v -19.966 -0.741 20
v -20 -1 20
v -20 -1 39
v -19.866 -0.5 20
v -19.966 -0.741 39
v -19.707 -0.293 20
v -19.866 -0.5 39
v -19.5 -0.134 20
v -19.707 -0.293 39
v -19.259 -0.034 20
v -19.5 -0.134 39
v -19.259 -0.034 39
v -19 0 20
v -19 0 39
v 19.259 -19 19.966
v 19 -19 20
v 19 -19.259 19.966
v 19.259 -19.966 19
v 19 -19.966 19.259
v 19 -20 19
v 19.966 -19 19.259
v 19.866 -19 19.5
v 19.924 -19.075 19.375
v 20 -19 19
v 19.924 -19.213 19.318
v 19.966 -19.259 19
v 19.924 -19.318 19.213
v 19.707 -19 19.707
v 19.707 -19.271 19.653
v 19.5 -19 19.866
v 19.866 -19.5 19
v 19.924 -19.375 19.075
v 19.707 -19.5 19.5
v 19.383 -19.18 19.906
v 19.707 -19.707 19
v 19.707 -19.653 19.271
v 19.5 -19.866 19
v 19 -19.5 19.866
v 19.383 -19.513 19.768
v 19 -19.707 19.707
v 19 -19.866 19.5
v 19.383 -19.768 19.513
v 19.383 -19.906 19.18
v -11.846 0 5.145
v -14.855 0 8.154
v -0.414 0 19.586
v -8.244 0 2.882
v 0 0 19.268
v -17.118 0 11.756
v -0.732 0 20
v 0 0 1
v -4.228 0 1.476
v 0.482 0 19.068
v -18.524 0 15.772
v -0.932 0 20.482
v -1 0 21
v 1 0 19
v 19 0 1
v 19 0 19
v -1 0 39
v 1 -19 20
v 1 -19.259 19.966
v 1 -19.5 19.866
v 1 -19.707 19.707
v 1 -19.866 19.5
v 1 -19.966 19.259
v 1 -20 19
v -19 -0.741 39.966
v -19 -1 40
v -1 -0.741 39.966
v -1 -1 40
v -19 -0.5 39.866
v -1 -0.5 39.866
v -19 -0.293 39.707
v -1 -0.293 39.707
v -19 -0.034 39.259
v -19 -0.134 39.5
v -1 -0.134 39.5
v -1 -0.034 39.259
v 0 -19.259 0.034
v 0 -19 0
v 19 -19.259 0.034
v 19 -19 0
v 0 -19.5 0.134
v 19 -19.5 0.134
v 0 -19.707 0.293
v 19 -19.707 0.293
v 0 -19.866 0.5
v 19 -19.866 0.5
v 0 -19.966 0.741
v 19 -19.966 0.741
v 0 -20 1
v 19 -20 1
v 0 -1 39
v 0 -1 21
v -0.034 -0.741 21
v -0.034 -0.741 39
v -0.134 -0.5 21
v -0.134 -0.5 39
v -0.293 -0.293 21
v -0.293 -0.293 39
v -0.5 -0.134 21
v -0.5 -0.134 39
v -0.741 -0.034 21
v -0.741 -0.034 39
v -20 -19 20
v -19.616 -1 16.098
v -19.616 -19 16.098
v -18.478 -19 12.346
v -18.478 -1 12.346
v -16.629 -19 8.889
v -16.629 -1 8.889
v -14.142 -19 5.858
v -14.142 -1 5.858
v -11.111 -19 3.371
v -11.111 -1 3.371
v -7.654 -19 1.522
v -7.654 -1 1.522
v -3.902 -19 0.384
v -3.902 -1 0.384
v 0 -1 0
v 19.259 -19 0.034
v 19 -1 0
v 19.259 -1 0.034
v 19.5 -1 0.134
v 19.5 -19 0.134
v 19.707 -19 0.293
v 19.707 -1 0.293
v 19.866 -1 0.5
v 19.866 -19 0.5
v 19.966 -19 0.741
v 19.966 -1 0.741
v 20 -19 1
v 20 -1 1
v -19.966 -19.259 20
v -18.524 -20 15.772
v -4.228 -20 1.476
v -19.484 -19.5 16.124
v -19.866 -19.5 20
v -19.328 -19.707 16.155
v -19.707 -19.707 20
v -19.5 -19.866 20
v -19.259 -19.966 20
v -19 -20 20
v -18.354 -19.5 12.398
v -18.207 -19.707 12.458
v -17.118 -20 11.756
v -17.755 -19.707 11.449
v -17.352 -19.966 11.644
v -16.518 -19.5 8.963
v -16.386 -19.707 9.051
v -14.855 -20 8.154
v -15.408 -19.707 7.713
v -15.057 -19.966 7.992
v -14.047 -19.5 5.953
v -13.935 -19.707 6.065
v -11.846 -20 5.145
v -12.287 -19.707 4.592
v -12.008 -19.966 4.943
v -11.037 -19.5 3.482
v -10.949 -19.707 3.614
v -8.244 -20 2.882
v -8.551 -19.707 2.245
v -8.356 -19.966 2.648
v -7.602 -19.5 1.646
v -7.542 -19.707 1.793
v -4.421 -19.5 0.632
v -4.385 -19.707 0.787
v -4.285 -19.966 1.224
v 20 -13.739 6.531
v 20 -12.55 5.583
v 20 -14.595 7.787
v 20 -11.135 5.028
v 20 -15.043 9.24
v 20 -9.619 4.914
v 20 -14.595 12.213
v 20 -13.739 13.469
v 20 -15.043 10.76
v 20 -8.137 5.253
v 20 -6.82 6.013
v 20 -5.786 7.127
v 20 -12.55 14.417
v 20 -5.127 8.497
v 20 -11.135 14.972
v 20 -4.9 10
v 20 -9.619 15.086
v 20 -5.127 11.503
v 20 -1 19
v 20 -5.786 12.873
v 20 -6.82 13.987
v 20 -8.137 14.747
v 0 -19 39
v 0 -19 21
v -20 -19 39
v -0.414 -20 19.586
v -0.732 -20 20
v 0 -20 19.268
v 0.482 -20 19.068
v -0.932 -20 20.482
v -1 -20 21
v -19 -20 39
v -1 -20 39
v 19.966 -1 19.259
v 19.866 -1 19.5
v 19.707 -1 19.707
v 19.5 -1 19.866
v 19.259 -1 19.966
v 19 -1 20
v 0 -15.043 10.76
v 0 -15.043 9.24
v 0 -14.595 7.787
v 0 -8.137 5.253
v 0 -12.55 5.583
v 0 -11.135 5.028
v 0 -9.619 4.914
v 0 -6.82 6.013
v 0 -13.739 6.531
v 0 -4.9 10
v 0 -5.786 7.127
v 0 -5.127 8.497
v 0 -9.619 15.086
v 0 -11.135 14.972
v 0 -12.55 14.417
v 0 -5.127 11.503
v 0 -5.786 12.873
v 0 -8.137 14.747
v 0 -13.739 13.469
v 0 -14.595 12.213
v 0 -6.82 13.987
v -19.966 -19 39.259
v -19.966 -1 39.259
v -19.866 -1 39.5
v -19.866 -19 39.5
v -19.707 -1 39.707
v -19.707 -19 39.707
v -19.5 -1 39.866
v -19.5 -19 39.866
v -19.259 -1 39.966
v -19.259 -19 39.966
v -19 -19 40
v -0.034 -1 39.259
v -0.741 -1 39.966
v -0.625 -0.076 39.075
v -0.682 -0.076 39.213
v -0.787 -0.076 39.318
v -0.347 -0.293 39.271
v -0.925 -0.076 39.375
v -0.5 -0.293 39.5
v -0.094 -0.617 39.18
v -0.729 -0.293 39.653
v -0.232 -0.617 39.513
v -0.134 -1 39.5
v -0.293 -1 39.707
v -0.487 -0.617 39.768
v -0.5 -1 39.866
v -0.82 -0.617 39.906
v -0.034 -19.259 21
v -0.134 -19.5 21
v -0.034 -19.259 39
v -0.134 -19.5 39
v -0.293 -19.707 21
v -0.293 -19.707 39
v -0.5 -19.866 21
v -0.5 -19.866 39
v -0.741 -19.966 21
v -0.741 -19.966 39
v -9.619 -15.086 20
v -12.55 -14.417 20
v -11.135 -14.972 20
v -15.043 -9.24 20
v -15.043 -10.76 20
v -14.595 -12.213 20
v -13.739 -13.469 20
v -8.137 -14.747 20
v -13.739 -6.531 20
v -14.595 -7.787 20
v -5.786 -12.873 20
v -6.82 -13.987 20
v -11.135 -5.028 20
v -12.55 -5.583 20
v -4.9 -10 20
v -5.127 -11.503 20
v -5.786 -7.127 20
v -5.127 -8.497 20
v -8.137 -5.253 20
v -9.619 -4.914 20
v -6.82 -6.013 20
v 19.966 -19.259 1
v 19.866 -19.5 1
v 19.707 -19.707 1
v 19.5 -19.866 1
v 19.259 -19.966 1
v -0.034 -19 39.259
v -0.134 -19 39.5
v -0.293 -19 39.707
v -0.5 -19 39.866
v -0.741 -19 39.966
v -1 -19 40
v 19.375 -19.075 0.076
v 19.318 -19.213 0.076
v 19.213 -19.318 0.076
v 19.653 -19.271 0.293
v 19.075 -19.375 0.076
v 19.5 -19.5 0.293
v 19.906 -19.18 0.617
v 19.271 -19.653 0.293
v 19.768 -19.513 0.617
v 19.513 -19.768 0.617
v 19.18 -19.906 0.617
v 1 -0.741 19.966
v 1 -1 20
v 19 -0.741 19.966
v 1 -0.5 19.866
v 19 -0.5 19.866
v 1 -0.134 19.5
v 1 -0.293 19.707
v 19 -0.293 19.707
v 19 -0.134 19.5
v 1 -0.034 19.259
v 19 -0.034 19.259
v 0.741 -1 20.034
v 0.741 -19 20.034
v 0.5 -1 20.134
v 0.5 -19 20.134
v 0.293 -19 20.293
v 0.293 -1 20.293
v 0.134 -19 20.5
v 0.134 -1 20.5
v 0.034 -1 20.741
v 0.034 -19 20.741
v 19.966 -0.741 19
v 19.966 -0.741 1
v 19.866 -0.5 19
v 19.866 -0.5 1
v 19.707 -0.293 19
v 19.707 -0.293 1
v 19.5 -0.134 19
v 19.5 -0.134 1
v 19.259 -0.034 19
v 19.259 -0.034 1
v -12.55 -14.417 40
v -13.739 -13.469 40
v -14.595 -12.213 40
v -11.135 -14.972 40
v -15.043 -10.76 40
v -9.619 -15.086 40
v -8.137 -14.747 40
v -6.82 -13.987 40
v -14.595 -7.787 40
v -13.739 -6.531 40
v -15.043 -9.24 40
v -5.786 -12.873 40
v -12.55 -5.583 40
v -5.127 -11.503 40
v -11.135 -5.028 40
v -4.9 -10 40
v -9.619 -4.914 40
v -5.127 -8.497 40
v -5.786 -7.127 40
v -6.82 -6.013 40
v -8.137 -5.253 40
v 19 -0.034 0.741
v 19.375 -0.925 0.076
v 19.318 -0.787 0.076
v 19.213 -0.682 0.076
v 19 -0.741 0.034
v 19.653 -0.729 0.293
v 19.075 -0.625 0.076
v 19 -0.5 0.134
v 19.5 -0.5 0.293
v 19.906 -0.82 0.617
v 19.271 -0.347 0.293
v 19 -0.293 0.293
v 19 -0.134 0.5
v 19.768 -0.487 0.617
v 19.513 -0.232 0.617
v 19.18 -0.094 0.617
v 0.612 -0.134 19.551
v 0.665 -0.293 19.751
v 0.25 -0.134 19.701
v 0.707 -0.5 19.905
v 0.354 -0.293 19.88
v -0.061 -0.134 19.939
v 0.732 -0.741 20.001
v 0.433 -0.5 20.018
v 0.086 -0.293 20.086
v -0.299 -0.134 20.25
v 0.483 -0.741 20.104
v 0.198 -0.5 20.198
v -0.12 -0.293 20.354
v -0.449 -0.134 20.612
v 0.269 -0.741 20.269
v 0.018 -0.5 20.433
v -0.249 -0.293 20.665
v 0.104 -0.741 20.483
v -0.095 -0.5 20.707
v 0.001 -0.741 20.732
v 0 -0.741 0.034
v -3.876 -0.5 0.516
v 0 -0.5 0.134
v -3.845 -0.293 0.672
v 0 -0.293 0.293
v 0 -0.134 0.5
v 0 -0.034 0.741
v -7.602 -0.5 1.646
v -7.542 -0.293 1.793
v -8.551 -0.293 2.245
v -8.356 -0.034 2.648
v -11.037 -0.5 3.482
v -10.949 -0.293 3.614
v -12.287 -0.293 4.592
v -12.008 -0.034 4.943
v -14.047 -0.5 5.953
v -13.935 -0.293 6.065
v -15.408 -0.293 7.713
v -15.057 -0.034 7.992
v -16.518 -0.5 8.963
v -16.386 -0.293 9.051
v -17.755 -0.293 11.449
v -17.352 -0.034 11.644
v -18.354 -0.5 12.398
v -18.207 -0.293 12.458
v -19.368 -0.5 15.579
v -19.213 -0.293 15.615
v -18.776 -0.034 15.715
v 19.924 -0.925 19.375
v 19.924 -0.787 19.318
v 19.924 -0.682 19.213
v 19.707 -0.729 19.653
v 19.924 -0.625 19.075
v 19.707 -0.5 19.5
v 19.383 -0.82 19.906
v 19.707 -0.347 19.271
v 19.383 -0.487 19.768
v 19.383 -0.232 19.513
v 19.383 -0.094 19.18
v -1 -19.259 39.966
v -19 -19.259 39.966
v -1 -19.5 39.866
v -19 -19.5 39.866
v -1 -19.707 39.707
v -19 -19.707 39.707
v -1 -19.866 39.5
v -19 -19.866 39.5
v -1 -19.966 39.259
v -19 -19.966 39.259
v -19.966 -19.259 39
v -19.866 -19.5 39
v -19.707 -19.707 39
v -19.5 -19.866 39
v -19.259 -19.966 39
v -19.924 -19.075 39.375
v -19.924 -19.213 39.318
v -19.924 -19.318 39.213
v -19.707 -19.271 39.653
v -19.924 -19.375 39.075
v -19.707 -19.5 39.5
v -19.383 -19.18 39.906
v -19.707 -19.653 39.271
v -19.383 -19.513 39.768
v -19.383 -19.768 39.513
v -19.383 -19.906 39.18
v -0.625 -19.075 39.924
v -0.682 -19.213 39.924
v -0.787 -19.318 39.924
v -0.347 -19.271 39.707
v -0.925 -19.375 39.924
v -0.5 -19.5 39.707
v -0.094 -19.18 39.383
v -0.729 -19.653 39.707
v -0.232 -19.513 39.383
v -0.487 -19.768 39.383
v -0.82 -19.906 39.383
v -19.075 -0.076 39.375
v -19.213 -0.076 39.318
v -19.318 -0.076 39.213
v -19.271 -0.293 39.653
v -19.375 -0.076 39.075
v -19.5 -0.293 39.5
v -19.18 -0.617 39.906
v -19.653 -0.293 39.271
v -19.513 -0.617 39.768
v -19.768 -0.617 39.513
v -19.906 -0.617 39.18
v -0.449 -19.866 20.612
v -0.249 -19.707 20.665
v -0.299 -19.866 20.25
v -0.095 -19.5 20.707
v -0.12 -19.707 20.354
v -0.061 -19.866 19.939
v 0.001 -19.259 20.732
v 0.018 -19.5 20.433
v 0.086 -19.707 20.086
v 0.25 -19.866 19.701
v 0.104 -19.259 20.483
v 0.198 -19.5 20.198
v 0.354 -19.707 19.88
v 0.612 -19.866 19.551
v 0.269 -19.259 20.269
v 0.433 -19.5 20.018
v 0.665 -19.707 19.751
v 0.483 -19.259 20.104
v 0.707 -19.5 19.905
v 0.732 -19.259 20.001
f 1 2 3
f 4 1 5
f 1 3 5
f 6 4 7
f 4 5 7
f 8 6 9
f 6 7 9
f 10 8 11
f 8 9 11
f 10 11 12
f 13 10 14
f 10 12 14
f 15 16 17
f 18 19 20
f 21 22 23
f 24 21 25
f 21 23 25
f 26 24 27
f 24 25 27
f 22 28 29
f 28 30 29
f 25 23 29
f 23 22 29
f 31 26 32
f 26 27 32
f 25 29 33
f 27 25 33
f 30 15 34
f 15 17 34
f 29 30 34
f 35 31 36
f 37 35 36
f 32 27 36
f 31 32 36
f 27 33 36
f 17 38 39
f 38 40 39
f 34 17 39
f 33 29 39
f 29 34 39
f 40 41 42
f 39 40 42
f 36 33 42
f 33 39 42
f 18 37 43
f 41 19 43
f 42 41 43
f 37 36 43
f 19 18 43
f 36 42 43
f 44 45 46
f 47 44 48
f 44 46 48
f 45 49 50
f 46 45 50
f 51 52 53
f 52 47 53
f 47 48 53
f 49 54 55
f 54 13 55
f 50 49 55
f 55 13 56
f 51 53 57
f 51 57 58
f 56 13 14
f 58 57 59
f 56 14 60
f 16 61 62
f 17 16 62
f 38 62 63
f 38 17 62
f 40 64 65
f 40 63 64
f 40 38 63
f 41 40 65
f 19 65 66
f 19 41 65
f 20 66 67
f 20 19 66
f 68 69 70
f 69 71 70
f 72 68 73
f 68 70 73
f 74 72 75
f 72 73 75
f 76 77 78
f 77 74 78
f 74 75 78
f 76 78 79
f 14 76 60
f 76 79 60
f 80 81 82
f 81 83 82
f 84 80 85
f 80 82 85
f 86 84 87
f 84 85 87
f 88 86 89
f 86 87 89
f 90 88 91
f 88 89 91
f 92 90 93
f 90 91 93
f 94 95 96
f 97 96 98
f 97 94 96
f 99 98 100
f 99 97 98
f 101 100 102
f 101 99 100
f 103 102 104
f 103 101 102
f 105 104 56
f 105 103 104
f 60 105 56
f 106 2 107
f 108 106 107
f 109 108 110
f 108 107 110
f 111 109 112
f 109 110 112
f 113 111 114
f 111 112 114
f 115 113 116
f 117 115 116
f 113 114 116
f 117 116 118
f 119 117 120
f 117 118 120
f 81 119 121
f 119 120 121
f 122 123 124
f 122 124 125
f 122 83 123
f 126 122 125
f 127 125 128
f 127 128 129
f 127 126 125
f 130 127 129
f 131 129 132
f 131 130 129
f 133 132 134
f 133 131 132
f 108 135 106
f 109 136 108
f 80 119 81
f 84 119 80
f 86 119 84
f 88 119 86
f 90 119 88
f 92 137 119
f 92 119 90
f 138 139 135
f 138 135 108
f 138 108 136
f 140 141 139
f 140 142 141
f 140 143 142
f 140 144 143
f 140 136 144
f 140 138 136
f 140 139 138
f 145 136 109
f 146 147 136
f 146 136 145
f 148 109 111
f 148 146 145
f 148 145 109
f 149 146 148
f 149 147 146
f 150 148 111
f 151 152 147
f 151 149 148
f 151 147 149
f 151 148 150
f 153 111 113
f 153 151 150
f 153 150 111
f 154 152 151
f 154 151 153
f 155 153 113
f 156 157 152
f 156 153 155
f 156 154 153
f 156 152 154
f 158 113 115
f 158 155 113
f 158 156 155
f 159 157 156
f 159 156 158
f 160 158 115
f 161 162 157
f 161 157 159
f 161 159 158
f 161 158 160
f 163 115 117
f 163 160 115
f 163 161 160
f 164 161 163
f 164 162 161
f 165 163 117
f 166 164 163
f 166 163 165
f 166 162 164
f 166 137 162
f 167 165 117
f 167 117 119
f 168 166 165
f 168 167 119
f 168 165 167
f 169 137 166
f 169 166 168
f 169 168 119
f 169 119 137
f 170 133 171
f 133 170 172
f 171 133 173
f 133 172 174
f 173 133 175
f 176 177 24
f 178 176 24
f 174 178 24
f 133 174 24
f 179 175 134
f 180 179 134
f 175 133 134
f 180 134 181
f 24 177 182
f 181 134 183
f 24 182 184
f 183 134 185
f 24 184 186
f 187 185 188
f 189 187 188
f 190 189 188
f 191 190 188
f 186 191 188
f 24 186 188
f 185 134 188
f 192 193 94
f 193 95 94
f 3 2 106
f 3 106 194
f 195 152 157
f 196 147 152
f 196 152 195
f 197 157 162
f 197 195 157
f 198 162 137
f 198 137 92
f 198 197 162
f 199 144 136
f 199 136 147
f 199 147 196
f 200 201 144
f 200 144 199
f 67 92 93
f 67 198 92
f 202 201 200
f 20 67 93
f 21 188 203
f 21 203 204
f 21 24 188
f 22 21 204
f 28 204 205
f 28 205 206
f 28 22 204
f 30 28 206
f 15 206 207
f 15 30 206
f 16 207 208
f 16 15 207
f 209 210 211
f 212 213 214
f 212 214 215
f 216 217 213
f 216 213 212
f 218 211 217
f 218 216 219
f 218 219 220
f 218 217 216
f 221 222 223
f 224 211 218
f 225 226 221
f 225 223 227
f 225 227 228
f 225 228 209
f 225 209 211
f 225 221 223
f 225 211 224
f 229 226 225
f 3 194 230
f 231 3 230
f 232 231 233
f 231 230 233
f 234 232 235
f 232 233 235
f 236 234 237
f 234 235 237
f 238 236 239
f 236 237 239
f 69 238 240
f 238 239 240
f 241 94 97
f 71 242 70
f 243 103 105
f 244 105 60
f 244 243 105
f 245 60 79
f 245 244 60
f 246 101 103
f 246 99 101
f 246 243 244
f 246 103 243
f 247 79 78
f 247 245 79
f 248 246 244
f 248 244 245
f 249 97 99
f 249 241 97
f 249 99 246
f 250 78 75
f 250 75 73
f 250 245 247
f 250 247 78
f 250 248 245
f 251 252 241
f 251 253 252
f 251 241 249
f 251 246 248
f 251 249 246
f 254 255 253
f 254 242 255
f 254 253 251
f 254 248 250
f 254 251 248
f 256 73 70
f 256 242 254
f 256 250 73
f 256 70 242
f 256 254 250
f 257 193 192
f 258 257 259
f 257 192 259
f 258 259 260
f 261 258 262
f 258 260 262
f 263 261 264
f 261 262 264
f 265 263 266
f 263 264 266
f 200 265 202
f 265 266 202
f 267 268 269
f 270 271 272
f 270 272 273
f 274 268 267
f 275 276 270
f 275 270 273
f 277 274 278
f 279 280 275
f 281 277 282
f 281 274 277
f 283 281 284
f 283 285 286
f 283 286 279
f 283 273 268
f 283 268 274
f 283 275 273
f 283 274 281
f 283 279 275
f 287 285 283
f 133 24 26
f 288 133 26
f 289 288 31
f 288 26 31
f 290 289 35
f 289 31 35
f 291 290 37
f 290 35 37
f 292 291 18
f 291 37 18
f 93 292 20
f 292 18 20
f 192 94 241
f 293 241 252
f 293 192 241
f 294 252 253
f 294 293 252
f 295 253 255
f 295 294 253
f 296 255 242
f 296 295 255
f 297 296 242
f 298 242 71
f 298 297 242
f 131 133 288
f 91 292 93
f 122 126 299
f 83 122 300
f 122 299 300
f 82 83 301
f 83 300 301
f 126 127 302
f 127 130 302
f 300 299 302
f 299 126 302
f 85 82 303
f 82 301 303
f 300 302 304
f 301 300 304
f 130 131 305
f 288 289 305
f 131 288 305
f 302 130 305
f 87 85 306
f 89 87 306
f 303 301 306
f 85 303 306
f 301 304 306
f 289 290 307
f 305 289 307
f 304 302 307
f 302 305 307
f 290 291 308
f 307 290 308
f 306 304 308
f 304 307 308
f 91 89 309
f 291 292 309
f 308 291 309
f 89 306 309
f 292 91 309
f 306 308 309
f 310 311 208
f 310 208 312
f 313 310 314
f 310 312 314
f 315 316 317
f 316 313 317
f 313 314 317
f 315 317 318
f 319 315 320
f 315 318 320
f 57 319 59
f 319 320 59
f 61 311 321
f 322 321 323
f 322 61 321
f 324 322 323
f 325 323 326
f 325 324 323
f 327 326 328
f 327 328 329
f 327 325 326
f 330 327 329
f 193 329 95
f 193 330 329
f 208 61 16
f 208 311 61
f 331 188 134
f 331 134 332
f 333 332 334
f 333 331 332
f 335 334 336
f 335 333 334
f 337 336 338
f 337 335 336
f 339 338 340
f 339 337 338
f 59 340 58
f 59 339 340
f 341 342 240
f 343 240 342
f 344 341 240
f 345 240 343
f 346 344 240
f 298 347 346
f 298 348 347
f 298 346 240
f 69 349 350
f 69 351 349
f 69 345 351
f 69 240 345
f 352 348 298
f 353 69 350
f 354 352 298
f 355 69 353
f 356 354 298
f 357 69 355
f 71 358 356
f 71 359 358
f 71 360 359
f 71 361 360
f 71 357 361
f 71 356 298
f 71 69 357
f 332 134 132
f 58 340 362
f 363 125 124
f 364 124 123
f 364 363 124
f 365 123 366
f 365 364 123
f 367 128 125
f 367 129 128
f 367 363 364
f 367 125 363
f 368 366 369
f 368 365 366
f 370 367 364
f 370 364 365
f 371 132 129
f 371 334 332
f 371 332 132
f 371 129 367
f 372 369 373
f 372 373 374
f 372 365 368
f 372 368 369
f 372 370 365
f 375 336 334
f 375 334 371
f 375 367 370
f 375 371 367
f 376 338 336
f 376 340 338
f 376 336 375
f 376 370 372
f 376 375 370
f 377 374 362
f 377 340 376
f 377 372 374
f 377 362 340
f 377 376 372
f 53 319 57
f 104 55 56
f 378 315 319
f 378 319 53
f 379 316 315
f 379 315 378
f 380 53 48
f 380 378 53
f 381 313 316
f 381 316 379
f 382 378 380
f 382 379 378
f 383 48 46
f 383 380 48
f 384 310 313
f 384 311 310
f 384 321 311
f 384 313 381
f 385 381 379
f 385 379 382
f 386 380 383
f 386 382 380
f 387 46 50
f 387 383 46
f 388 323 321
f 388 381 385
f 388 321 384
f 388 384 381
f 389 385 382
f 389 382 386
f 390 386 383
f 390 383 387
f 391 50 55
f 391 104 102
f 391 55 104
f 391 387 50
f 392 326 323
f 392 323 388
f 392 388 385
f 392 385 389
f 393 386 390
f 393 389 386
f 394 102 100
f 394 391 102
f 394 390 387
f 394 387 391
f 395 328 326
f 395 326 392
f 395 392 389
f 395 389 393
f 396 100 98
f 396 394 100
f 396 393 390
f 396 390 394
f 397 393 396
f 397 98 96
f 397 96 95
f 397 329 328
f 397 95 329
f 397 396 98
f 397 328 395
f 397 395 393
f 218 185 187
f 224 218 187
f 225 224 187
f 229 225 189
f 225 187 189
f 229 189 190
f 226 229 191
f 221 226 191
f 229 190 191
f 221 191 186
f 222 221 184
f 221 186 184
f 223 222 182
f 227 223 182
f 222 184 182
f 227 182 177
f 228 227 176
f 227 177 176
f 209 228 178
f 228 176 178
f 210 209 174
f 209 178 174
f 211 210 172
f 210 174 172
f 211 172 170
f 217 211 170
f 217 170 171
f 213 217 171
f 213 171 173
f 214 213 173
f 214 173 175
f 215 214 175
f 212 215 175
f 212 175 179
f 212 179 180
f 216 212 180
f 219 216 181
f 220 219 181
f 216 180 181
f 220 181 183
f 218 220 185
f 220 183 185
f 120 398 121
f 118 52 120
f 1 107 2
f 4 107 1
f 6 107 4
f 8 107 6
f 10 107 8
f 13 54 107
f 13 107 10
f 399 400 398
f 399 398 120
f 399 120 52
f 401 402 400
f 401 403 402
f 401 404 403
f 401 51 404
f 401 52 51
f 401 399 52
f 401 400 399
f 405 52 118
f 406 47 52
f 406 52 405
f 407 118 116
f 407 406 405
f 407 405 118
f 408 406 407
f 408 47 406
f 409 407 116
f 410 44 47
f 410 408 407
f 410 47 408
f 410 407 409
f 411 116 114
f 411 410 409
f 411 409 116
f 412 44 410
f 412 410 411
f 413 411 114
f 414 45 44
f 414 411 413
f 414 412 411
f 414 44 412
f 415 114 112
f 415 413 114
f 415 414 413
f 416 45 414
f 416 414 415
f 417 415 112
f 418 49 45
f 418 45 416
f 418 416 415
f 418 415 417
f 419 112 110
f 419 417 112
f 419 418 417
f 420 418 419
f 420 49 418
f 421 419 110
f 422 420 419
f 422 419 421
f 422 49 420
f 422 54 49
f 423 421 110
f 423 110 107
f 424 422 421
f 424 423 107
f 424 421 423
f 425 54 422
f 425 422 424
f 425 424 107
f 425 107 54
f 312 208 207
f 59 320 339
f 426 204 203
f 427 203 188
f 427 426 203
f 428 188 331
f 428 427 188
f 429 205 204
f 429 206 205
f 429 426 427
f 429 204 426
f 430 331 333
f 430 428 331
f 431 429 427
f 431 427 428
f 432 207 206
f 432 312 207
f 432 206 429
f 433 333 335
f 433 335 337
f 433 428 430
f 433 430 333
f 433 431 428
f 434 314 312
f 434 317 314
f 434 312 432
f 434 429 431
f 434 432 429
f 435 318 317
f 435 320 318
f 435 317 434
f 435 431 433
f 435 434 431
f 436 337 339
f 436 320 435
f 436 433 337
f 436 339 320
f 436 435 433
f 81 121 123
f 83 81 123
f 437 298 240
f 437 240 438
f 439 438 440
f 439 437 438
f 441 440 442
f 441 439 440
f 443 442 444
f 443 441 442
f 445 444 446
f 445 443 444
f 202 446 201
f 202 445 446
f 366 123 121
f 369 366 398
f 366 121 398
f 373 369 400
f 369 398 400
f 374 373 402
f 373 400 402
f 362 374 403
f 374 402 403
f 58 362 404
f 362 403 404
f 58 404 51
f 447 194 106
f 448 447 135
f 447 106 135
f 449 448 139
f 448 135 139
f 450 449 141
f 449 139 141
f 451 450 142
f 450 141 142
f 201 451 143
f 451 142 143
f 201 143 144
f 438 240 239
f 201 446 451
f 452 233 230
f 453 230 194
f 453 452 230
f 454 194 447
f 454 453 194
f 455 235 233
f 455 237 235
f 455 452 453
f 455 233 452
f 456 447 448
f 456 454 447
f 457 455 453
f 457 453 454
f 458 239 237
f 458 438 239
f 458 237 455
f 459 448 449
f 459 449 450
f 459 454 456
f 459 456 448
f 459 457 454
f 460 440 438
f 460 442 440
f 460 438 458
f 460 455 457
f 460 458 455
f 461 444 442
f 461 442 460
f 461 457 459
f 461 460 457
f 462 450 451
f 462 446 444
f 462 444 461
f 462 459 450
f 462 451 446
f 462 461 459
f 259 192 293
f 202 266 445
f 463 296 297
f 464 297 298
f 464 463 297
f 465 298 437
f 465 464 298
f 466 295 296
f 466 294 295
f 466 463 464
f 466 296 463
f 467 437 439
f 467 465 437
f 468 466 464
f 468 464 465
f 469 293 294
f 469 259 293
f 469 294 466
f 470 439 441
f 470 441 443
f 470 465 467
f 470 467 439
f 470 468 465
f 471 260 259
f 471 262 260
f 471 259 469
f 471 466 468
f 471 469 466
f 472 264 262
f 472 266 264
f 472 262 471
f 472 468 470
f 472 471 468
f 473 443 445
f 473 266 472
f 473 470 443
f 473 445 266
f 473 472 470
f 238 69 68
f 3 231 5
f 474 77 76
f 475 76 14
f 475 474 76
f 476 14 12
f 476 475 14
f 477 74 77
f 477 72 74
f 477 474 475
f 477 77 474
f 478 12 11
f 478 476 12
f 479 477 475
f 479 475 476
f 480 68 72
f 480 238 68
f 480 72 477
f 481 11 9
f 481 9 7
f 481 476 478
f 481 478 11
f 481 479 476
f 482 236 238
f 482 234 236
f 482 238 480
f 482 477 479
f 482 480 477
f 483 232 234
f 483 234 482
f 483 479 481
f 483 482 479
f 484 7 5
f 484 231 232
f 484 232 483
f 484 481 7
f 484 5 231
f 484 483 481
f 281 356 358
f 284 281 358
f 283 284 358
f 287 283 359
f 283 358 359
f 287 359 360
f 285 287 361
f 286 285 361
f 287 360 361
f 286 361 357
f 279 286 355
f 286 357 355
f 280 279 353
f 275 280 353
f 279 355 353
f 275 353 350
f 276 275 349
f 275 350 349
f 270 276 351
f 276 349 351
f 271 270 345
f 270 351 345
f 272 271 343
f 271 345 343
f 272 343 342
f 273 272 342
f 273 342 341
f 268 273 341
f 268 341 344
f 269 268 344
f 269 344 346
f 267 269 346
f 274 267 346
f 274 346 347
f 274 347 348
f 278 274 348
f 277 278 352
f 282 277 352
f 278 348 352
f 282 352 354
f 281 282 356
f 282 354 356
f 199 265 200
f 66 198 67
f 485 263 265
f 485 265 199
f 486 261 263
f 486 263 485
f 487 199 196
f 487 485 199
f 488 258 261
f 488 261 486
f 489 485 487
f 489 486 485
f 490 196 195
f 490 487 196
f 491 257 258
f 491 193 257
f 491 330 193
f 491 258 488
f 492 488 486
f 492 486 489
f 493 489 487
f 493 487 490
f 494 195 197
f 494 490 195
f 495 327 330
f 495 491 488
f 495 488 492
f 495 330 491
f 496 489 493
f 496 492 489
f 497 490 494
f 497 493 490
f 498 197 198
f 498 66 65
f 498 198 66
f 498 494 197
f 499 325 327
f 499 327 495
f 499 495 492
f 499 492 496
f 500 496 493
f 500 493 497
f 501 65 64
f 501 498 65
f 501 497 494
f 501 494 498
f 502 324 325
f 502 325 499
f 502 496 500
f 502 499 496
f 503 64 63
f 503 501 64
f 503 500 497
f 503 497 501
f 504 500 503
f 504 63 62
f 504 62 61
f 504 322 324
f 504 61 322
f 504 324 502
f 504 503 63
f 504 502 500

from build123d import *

# Parameters (mm, degrees)
F0_W     = 20
F0_H     = 20
F1_DEPTH = 20
F2_R     = 1
F3_R     = 5.1
F4_DEPTH = 20
F5_R     = 5.1
F6_DEPTH = 20


with BuildPart() as f1:
    # F0 (on Front) → F1 (new body)
    with BuildSketch(Plane.XZ):
        with Locations((-10, 30)):
            Rectangle(F0_W, F0_H)
        with Locations((10, 10)):
            Rectangle(F0_W, F0_H)
        Polygon((-20, 20), (0, 0), (0, 20), align=None)
        with BuildLine():
            ThreePointArc((-20, 20), (-14.1421356237, 5.8578643763), (0, 0))
            Line((0, 0), (-20, 20))
        make_face()
    extrude(amount=F1_DEPTH)

    # F2
    f2_edges = [f1.edges().sort_by_distance(p)[0] for p in [
        (0, -20, 30),
        (0, -10, 40),
        (-10, -20, 40),
        (-20, -10, 40),
        (10, -20, 20),
        (10, 0, 20),
        (20, -10, 20),
        (20, -20, 10),
        (20, 0, 10),
        (20, -10, 0),
        (10, -20, 0),
        (-20, -20, 30),
        (0, 0, 30),
        (-10, 0, 40),
        (-20, 0, 30),
        (10, 0, 0),
        (-14.142136, -20, 5.857864),
        (0, -10, 20),
    ]]
    fillet(f2_edges, radius=F2_R)

    # F3 (on face) → F4 (cut)
    with BuildSketch(Plane.XY.offset(40)):
        with Locations((-10, -10)):
            Circle(F3_R)
    extrude(amount=-F4_DEPTH, mode=Mode.SUBTRACT)

    # F5 (on face) → F6 (cut)
    with BuildSketch(Plane.YZ.offset(20)):
        with Locations((-10, 10)):
            Circle(F5_R)
    extrude(amount=-F6_DEPTH, mode=Mode.SUBTRACT)


solid = f1.part
